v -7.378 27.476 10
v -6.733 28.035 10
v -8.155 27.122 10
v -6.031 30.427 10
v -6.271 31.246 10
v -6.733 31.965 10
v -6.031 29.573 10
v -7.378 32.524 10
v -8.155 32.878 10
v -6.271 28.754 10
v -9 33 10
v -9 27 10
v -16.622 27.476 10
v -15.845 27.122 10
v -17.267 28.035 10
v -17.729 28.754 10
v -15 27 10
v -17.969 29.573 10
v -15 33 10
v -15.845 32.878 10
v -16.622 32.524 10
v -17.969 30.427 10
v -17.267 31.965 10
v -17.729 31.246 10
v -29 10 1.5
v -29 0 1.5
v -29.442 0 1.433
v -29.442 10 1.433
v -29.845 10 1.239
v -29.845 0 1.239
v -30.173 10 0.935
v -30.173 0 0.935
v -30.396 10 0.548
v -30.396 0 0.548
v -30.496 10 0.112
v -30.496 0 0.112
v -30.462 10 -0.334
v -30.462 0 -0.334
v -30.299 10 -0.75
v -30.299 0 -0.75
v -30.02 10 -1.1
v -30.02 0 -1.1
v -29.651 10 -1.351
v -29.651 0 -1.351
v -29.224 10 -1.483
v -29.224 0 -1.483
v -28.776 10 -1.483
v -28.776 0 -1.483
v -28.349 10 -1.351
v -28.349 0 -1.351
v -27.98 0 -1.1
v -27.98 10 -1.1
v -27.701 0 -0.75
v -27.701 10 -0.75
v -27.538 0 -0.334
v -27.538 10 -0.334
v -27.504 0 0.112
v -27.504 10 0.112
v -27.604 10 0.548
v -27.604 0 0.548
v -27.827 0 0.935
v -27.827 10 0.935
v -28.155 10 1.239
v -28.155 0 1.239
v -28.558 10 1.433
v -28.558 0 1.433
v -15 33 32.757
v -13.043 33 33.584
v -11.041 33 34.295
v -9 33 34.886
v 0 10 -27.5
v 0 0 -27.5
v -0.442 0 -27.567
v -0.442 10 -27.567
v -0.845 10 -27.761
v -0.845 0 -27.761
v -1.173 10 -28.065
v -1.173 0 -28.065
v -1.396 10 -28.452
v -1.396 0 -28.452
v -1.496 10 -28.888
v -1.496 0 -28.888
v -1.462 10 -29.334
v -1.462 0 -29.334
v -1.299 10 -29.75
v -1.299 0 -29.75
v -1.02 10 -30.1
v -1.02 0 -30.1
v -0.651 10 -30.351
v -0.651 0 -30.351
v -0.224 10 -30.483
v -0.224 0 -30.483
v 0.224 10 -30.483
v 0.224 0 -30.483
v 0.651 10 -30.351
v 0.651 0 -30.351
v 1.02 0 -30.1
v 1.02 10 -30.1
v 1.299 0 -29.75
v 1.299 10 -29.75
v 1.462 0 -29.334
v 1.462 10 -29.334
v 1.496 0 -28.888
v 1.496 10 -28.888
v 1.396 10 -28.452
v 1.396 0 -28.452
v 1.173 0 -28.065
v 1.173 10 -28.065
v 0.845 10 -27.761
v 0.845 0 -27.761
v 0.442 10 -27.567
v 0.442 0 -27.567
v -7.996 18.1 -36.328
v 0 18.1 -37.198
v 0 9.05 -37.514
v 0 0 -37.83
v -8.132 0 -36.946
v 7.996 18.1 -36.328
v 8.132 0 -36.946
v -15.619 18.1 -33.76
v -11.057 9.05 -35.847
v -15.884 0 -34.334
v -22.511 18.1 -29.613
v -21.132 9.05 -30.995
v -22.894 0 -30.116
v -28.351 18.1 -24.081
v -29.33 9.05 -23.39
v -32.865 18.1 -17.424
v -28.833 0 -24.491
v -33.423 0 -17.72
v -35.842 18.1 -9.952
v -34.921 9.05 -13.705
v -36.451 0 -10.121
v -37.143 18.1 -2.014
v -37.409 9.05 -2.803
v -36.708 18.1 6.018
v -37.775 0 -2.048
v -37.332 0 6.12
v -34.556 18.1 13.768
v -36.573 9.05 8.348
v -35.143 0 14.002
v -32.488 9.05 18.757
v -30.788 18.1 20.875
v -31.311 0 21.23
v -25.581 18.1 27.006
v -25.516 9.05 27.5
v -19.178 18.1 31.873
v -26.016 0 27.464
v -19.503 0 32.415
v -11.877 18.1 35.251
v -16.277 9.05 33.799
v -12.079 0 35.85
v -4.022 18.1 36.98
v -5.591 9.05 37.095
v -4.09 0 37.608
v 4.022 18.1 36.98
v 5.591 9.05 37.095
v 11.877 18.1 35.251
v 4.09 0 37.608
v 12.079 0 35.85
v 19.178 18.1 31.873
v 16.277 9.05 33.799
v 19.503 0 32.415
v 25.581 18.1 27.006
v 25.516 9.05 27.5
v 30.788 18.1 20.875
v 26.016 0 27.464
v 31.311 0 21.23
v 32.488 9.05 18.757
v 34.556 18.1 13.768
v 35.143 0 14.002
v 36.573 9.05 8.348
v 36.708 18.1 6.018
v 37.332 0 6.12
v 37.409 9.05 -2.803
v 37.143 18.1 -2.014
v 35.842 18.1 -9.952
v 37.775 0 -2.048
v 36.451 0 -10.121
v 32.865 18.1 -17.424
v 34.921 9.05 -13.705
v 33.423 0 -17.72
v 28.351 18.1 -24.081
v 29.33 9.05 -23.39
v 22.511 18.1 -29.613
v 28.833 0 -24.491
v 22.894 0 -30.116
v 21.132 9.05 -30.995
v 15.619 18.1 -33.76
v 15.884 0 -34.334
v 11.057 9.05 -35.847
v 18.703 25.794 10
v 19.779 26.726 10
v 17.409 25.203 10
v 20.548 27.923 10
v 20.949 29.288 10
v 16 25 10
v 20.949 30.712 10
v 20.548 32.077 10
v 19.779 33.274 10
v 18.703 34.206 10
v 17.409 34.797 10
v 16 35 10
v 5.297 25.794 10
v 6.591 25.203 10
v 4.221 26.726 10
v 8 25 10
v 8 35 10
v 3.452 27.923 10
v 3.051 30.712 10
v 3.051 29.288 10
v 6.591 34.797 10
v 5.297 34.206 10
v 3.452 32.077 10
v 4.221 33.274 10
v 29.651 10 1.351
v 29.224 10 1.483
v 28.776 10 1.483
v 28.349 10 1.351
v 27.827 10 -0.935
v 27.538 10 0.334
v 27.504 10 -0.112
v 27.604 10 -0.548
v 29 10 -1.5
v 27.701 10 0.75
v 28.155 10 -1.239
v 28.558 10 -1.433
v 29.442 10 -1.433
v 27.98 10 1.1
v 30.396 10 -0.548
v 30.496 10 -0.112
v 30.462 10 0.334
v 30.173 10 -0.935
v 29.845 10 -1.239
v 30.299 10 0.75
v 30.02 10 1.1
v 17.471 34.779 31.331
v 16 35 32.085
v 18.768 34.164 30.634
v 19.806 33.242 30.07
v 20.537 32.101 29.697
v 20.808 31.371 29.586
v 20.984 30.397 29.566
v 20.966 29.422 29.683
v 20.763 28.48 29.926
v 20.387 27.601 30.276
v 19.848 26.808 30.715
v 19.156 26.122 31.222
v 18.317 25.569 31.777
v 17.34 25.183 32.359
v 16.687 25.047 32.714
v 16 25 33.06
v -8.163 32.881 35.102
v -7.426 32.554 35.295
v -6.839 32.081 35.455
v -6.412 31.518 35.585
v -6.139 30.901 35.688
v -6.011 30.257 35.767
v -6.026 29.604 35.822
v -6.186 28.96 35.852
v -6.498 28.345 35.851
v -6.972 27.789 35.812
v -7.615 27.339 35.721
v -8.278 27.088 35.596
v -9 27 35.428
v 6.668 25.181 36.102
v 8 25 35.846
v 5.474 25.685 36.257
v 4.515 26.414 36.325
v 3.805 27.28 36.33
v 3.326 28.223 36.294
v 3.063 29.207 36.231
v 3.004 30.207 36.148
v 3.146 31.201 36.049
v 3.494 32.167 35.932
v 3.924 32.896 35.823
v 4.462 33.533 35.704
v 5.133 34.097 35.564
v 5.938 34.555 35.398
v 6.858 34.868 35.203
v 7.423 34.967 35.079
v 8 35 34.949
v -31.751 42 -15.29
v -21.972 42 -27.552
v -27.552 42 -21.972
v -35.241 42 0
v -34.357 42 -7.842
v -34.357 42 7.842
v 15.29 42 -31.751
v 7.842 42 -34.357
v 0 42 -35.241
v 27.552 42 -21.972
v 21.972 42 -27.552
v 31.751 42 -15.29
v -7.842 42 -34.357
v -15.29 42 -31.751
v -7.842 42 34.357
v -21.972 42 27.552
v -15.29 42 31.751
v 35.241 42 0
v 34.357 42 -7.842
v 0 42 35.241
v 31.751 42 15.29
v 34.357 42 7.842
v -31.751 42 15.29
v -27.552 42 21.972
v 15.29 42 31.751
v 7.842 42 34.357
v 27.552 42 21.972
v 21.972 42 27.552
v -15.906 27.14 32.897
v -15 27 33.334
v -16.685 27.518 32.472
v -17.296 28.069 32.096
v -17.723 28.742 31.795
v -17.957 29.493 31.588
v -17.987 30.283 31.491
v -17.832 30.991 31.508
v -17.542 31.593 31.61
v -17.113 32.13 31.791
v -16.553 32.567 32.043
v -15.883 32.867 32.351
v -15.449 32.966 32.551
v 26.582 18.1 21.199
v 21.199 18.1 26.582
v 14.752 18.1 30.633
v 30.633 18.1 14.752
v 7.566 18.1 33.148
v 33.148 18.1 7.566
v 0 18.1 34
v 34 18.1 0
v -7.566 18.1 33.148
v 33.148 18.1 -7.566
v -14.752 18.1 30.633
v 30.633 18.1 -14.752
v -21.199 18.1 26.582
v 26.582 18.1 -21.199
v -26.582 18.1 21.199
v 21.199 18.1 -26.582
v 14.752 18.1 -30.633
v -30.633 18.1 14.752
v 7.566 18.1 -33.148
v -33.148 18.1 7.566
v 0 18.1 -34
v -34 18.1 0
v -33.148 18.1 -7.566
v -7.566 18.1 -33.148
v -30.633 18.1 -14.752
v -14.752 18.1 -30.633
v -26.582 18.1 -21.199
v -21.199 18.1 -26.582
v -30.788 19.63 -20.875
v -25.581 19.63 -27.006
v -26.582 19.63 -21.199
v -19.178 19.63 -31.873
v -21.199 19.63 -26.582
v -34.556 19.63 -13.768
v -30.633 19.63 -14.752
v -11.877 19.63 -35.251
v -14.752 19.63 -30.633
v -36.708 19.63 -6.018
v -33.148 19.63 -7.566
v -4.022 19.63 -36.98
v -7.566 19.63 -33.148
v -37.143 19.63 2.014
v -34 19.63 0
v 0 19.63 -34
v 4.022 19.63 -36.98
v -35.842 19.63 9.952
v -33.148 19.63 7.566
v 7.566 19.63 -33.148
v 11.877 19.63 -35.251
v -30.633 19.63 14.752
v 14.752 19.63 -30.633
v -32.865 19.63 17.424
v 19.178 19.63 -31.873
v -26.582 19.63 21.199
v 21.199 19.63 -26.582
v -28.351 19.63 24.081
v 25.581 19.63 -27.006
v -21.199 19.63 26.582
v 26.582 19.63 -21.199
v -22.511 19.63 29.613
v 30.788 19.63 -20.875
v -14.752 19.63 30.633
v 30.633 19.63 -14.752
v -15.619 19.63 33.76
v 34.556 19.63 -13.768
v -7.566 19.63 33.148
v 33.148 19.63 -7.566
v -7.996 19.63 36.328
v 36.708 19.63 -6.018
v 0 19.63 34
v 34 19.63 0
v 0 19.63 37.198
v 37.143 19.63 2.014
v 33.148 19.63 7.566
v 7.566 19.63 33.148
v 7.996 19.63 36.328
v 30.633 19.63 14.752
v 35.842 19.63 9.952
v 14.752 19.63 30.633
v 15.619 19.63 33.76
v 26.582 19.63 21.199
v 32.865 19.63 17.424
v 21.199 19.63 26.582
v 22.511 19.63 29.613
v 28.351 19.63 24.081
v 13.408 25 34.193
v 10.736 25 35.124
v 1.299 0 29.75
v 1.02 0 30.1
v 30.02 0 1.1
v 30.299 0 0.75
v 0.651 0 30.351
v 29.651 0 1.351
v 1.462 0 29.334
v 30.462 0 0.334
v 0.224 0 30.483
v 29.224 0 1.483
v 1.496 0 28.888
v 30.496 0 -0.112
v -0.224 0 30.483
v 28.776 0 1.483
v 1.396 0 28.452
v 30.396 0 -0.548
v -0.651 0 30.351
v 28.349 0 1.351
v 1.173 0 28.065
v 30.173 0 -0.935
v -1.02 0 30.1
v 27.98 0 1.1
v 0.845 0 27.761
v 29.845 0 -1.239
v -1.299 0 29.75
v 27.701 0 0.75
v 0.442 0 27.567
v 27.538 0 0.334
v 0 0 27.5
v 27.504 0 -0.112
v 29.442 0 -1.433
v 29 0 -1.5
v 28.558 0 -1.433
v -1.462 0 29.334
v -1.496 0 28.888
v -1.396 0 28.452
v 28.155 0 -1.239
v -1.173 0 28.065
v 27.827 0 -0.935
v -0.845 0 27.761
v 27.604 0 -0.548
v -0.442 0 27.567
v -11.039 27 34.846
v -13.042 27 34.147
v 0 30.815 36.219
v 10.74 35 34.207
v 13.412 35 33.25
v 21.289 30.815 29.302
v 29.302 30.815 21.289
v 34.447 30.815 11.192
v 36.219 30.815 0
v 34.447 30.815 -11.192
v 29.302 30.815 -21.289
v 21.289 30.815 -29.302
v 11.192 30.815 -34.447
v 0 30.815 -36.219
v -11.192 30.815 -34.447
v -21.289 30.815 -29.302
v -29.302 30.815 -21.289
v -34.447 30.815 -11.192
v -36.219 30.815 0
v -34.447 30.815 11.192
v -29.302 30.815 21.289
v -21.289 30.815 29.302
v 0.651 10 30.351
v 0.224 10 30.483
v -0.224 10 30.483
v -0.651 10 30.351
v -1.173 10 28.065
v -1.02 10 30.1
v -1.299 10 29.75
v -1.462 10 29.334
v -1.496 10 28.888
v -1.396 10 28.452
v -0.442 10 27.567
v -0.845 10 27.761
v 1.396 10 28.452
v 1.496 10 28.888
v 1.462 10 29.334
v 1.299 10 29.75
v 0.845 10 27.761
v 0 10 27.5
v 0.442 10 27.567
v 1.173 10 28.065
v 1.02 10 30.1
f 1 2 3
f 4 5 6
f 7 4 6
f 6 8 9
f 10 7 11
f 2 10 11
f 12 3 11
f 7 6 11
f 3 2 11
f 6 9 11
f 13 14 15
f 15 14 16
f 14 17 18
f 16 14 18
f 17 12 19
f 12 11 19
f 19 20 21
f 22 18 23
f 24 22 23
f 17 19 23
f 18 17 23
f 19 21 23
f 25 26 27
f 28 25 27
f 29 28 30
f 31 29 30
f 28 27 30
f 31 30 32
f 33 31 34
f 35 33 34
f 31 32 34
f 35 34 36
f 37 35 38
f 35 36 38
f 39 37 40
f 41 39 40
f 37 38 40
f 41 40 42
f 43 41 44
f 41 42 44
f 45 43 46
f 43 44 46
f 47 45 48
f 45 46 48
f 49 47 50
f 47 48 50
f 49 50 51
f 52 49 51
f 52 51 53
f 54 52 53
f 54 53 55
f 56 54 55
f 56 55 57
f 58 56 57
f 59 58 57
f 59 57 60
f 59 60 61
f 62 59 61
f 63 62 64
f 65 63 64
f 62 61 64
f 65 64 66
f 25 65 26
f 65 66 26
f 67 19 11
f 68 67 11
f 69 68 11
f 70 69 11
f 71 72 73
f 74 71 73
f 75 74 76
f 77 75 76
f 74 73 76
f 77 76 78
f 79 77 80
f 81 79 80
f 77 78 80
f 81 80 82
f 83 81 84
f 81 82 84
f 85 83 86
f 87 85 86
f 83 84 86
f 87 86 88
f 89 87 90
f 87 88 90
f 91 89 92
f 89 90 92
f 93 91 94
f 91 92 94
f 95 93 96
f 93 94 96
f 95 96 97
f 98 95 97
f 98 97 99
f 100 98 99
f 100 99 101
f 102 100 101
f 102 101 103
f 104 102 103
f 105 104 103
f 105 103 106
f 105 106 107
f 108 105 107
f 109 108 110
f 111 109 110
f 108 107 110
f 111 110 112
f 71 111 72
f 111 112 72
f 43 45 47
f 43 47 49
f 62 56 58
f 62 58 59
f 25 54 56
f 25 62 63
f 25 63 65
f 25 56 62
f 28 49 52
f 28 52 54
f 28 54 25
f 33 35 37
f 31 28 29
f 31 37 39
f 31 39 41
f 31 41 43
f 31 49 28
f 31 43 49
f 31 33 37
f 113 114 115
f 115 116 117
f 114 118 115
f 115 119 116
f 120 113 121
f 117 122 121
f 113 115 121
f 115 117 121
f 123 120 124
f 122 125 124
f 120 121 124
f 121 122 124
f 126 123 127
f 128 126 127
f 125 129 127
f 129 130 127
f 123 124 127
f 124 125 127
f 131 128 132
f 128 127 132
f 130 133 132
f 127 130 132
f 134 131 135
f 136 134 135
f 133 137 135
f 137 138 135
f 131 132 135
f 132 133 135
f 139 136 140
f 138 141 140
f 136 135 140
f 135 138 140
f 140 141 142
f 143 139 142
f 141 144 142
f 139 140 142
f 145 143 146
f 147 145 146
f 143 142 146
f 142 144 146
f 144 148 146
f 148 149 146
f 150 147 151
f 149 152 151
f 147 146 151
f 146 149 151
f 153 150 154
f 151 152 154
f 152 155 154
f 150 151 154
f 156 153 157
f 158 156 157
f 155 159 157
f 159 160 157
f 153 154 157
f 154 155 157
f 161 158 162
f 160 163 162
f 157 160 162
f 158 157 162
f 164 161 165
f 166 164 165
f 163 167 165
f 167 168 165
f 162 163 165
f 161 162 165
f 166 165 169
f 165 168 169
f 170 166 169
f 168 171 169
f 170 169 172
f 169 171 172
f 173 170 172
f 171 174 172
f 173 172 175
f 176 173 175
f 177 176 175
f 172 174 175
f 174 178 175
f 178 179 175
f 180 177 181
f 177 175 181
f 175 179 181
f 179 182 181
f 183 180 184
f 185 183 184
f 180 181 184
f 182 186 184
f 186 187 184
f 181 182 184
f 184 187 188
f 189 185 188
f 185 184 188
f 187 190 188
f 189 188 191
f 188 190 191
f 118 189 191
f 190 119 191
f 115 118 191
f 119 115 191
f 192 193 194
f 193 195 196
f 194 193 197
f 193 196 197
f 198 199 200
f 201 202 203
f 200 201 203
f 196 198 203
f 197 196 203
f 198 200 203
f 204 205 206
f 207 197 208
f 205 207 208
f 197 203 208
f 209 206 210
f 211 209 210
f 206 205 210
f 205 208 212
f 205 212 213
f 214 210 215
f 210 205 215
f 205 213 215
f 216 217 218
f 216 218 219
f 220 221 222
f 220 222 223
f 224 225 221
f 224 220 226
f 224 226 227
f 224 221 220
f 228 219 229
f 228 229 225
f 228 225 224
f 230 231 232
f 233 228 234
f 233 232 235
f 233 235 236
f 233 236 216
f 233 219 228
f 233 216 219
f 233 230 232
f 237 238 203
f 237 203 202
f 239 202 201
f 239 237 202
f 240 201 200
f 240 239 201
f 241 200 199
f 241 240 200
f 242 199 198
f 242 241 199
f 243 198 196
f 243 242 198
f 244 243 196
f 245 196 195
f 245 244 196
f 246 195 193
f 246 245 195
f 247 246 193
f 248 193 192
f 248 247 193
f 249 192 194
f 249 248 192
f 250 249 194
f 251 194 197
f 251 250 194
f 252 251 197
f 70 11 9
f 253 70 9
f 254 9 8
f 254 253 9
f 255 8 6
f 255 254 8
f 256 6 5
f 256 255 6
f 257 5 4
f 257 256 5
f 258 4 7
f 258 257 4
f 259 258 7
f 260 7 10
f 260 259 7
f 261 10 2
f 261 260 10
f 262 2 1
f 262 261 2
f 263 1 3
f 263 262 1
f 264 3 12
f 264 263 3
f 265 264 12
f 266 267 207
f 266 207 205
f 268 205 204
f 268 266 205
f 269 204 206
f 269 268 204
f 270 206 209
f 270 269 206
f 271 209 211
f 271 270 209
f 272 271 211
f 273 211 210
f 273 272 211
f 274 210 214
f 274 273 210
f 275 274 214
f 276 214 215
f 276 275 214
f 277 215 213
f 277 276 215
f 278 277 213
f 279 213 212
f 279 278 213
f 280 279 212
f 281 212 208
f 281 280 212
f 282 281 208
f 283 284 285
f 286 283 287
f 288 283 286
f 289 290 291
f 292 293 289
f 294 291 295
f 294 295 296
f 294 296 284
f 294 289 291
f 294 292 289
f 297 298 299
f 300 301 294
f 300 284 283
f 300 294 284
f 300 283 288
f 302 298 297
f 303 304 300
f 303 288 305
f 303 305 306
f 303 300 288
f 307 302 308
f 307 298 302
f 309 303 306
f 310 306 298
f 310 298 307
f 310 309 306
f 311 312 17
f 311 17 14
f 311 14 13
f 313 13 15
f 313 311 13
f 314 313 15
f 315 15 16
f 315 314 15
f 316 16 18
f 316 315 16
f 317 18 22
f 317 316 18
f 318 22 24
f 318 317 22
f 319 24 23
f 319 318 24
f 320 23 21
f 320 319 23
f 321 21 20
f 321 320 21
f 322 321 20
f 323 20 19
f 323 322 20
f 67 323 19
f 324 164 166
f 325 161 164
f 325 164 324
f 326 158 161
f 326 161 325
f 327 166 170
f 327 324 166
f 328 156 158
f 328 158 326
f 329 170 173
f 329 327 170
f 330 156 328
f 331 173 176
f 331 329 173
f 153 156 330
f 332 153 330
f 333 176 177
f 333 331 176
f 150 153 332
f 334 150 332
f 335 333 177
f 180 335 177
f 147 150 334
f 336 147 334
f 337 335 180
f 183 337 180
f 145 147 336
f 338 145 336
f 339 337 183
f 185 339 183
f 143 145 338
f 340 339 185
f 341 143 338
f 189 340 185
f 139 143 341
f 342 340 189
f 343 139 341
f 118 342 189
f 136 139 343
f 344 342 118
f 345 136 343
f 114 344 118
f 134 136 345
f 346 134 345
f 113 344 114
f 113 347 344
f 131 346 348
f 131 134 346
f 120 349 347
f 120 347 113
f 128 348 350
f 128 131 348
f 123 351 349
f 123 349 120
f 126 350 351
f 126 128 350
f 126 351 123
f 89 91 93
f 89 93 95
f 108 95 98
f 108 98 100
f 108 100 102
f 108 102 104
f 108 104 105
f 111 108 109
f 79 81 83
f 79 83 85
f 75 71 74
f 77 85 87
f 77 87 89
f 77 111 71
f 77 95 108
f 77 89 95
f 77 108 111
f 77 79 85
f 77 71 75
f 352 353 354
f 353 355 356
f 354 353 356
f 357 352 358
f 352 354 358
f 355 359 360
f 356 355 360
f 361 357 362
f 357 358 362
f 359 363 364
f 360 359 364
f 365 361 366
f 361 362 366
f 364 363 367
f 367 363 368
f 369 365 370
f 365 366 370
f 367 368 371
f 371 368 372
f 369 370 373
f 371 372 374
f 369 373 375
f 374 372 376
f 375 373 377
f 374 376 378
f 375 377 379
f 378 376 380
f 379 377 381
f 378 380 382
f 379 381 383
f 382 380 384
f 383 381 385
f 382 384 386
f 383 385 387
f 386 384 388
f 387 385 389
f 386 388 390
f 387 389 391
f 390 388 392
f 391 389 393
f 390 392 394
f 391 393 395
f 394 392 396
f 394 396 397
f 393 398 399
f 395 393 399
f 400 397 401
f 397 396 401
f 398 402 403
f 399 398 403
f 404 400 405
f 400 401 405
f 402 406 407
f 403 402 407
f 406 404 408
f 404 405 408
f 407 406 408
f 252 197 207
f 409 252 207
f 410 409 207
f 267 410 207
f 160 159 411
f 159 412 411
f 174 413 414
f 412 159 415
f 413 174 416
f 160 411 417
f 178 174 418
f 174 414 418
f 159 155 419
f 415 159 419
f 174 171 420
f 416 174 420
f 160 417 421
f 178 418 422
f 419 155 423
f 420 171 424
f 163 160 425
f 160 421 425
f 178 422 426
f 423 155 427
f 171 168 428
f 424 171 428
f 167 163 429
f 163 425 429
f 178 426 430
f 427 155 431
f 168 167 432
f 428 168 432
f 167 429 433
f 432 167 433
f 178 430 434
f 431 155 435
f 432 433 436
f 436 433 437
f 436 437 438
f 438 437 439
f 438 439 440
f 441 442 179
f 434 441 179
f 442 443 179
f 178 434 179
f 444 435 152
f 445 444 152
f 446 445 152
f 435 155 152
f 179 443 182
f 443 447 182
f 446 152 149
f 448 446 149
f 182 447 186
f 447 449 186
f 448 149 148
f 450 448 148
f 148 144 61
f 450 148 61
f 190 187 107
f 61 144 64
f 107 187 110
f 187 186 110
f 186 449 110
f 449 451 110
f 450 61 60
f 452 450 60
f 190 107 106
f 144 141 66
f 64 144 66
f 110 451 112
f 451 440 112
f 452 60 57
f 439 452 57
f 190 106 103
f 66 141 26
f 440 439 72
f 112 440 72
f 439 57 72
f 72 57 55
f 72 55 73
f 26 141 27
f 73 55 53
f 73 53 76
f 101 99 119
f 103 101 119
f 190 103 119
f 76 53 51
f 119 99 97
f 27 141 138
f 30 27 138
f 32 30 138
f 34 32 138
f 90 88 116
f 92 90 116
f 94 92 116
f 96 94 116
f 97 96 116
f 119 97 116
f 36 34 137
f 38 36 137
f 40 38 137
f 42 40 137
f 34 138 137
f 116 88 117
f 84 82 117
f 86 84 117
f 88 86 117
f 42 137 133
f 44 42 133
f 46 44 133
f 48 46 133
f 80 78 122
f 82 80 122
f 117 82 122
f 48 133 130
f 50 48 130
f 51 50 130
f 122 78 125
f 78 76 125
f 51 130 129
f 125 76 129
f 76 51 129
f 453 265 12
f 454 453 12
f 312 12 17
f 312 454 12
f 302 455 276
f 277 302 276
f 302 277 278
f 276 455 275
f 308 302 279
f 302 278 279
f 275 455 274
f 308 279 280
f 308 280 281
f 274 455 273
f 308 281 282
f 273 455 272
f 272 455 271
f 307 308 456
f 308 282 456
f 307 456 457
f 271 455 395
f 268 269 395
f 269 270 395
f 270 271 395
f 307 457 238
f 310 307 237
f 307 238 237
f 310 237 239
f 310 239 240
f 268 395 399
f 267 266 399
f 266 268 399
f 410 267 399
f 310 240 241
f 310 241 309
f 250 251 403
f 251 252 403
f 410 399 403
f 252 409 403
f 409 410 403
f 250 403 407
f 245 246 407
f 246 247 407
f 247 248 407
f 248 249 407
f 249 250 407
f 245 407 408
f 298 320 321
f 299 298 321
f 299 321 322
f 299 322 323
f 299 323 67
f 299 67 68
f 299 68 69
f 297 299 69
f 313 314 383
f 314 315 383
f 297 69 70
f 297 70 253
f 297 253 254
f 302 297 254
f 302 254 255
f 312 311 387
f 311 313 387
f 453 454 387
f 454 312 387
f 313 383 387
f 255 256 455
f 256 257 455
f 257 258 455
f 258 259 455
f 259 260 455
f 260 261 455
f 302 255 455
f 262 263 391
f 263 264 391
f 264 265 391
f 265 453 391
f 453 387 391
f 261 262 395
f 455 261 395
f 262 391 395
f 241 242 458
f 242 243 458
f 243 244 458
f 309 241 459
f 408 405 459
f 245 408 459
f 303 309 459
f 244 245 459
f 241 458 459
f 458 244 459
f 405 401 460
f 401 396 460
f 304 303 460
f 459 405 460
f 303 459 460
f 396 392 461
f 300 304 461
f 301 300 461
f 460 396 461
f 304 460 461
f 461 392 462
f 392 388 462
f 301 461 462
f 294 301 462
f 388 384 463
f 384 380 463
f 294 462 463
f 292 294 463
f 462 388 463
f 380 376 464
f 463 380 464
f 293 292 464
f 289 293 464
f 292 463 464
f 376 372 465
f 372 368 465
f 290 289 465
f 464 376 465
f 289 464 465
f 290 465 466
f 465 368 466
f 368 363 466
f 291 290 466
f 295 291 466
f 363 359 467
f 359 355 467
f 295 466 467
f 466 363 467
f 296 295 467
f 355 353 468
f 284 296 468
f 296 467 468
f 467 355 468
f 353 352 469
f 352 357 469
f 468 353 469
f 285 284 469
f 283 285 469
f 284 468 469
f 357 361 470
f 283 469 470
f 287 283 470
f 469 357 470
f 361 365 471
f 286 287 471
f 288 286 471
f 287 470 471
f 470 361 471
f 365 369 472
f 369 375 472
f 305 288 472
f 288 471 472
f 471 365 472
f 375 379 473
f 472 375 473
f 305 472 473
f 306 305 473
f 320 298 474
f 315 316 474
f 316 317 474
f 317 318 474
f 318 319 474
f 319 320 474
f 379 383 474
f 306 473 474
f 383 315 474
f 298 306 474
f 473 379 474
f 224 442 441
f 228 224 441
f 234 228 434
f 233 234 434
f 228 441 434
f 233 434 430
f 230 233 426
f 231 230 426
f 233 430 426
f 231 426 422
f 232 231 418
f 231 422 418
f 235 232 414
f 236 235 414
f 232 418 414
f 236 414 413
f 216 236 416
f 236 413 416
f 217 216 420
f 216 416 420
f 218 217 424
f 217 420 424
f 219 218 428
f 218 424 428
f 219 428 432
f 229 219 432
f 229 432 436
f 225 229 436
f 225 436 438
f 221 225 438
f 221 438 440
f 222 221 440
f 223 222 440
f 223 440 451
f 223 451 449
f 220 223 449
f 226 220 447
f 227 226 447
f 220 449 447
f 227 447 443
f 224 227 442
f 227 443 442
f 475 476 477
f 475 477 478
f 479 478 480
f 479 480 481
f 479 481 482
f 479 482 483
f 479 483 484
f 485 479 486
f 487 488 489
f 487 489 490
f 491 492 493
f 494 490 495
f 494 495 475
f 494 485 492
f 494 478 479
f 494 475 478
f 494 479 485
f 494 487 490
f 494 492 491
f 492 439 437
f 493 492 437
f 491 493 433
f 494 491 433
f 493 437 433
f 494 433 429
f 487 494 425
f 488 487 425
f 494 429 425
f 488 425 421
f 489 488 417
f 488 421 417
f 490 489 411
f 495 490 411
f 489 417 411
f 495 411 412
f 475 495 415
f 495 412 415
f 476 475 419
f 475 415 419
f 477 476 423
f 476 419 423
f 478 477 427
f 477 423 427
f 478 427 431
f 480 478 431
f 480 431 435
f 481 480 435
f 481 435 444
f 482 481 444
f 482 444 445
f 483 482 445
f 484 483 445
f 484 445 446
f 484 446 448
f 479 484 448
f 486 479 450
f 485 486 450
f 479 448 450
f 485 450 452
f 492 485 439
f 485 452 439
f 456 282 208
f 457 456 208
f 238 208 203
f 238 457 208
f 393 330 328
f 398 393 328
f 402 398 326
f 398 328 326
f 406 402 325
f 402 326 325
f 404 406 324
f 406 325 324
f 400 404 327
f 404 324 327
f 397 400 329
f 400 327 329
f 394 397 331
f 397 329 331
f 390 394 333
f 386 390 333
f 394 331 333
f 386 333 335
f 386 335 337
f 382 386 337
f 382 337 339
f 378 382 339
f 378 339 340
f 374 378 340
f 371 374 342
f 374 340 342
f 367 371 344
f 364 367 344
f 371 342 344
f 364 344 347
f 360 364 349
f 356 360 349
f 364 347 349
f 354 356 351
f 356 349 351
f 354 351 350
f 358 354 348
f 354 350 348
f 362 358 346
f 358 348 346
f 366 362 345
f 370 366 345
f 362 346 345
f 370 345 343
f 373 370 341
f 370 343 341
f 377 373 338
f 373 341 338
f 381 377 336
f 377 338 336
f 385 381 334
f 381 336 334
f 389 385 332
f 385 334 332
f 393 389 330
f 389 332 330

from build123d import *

# Parameters (mm, degrees)
SKETCH_1_R          = 37.83
EXTRUDE_1_DEPTH     = 18.1
DRAFT_1_ANGLE       = -2
SKETCH_3_R          = 34
EXTRUDE_2_DEPTH     = 1.53
SKETCH_4_R          = 37.197934072
EXTRUDE_3_DEPTH     = 22.37
DRAFT_2_ANGLE       = -5
SKETCH_5_R          = 1.5
CUT_EXTRUDE_1_DEPTH = 10
CUT_EXTRUDE_2_DEPTH = 30


with BuildPart() as part:
    # 草图1 → 凸台-拉伸1 (new body)
    with BuildSketch(Plane(origin=(0, 0, 0), x_dir=(1, 0, 0), z_dir=(0, 1, 0))):
        with Locations(Location((0, 0, 0), (0, 0, 90))):
            Circle(SKETCH_1_R)
    extrude(amount=EXTRUDE_1_DEPTH)

    # 拔模1
    draft_1_faces = [part.faces().sort_by_distance(p)[0] for p in [
        (0, 9.05, 37.83),
    ]]
    draft(draft_1_faces, Plane(origin=(0, 0, 0), x_dir=(0, 0, -1), z_dir=(0, -1, 0)), DRAFT_1_ANGLE)

    # 草图3 → 凸台-拉伸2 (add)
    with BuildSketch(Plane(origin=(0, 18.1, 0), x_dir=(1, 0, 0), z_dir=(0, 1, 0))):
        with Locations(Location((0, 0, 0), (0, 0, 270))):
            Circle(SKETCH_3_R)
    extrude(amount=EXTRUDE_2_DEPTH)

    # 草图4 → 凸台-拉伸3 (add)
    with BuildSketch(Plane(origin=(0, 19.63, 0), x_dir=(1, 0, 0), z_dir=(0, 1, 0))):
        with Locations(Location((0, 0, 0), (0, 0, 270))):
            Circle(SKETCH_4_R)
    extrude(amount=EXTRUDE_3_DEPTH)

    # 拔模2
    draft_2_faces = [part.faces().sort_by_distance(p)[0] for p in [
        (0, 30.815, -37.197934072),
    ]]
    draft(draft_2_faces, Plane(origin=(0, 19.63, 0), x_dir=(0, 0, -1), z_dir=(0, -1, 0)), DRAFT_2_ANGLE)

    # 草图5 → 切除-拉伸1 (cut)
    with BuildSketch(Plane.XZ):
        with Locations(Location((29, 0, 0), (0, 0, 270))):
            Circle(SKETCH_5_R)
        with Locations(Location((-29, 0, 0), (0, 0, 90))):
            Circle(SKETCH_5_R)
        with Locations(Location((0, 29, 0), (0, 0, 270))):
            Circle(SKETCH_5_R)
        with Locations(Location((0, -29, 0), (0, 0, 90))):
            Circle(SKETCH_5_R)
    extrude(amount=-CUT_EXTRUDE_1_DEPTH, mode=Mode.SUBTRACT)

    # 草图6 → 切除-拉伸2 (cut)
    with BuildSketch(Plane.XY.offset(40)):
        with BuildLine():
            Line((8, 35), (16, 35))
            ThreePointArc((16, 35), (21, 30), (16, 25))
            Line((16, 25), (8, 25))
            ThreePointArc((8, 25), (3, 30), (8, 35))
        make_face()
        with BuildLine():
            Line((-15, 33), (-9, 33))
            ThreePointArc((-9, 33), (-6, 30), (-9, 27))
            Line((-9, 27), (-15, 27))
            ThreePointArc((-15, 27), (-18, 30), (-15, 33))
        make_face()
    extrude(amount=-CUT_EXTRUDE_2_DEPTH, mode=Mode.SUBTRACT)


solid = part.part
